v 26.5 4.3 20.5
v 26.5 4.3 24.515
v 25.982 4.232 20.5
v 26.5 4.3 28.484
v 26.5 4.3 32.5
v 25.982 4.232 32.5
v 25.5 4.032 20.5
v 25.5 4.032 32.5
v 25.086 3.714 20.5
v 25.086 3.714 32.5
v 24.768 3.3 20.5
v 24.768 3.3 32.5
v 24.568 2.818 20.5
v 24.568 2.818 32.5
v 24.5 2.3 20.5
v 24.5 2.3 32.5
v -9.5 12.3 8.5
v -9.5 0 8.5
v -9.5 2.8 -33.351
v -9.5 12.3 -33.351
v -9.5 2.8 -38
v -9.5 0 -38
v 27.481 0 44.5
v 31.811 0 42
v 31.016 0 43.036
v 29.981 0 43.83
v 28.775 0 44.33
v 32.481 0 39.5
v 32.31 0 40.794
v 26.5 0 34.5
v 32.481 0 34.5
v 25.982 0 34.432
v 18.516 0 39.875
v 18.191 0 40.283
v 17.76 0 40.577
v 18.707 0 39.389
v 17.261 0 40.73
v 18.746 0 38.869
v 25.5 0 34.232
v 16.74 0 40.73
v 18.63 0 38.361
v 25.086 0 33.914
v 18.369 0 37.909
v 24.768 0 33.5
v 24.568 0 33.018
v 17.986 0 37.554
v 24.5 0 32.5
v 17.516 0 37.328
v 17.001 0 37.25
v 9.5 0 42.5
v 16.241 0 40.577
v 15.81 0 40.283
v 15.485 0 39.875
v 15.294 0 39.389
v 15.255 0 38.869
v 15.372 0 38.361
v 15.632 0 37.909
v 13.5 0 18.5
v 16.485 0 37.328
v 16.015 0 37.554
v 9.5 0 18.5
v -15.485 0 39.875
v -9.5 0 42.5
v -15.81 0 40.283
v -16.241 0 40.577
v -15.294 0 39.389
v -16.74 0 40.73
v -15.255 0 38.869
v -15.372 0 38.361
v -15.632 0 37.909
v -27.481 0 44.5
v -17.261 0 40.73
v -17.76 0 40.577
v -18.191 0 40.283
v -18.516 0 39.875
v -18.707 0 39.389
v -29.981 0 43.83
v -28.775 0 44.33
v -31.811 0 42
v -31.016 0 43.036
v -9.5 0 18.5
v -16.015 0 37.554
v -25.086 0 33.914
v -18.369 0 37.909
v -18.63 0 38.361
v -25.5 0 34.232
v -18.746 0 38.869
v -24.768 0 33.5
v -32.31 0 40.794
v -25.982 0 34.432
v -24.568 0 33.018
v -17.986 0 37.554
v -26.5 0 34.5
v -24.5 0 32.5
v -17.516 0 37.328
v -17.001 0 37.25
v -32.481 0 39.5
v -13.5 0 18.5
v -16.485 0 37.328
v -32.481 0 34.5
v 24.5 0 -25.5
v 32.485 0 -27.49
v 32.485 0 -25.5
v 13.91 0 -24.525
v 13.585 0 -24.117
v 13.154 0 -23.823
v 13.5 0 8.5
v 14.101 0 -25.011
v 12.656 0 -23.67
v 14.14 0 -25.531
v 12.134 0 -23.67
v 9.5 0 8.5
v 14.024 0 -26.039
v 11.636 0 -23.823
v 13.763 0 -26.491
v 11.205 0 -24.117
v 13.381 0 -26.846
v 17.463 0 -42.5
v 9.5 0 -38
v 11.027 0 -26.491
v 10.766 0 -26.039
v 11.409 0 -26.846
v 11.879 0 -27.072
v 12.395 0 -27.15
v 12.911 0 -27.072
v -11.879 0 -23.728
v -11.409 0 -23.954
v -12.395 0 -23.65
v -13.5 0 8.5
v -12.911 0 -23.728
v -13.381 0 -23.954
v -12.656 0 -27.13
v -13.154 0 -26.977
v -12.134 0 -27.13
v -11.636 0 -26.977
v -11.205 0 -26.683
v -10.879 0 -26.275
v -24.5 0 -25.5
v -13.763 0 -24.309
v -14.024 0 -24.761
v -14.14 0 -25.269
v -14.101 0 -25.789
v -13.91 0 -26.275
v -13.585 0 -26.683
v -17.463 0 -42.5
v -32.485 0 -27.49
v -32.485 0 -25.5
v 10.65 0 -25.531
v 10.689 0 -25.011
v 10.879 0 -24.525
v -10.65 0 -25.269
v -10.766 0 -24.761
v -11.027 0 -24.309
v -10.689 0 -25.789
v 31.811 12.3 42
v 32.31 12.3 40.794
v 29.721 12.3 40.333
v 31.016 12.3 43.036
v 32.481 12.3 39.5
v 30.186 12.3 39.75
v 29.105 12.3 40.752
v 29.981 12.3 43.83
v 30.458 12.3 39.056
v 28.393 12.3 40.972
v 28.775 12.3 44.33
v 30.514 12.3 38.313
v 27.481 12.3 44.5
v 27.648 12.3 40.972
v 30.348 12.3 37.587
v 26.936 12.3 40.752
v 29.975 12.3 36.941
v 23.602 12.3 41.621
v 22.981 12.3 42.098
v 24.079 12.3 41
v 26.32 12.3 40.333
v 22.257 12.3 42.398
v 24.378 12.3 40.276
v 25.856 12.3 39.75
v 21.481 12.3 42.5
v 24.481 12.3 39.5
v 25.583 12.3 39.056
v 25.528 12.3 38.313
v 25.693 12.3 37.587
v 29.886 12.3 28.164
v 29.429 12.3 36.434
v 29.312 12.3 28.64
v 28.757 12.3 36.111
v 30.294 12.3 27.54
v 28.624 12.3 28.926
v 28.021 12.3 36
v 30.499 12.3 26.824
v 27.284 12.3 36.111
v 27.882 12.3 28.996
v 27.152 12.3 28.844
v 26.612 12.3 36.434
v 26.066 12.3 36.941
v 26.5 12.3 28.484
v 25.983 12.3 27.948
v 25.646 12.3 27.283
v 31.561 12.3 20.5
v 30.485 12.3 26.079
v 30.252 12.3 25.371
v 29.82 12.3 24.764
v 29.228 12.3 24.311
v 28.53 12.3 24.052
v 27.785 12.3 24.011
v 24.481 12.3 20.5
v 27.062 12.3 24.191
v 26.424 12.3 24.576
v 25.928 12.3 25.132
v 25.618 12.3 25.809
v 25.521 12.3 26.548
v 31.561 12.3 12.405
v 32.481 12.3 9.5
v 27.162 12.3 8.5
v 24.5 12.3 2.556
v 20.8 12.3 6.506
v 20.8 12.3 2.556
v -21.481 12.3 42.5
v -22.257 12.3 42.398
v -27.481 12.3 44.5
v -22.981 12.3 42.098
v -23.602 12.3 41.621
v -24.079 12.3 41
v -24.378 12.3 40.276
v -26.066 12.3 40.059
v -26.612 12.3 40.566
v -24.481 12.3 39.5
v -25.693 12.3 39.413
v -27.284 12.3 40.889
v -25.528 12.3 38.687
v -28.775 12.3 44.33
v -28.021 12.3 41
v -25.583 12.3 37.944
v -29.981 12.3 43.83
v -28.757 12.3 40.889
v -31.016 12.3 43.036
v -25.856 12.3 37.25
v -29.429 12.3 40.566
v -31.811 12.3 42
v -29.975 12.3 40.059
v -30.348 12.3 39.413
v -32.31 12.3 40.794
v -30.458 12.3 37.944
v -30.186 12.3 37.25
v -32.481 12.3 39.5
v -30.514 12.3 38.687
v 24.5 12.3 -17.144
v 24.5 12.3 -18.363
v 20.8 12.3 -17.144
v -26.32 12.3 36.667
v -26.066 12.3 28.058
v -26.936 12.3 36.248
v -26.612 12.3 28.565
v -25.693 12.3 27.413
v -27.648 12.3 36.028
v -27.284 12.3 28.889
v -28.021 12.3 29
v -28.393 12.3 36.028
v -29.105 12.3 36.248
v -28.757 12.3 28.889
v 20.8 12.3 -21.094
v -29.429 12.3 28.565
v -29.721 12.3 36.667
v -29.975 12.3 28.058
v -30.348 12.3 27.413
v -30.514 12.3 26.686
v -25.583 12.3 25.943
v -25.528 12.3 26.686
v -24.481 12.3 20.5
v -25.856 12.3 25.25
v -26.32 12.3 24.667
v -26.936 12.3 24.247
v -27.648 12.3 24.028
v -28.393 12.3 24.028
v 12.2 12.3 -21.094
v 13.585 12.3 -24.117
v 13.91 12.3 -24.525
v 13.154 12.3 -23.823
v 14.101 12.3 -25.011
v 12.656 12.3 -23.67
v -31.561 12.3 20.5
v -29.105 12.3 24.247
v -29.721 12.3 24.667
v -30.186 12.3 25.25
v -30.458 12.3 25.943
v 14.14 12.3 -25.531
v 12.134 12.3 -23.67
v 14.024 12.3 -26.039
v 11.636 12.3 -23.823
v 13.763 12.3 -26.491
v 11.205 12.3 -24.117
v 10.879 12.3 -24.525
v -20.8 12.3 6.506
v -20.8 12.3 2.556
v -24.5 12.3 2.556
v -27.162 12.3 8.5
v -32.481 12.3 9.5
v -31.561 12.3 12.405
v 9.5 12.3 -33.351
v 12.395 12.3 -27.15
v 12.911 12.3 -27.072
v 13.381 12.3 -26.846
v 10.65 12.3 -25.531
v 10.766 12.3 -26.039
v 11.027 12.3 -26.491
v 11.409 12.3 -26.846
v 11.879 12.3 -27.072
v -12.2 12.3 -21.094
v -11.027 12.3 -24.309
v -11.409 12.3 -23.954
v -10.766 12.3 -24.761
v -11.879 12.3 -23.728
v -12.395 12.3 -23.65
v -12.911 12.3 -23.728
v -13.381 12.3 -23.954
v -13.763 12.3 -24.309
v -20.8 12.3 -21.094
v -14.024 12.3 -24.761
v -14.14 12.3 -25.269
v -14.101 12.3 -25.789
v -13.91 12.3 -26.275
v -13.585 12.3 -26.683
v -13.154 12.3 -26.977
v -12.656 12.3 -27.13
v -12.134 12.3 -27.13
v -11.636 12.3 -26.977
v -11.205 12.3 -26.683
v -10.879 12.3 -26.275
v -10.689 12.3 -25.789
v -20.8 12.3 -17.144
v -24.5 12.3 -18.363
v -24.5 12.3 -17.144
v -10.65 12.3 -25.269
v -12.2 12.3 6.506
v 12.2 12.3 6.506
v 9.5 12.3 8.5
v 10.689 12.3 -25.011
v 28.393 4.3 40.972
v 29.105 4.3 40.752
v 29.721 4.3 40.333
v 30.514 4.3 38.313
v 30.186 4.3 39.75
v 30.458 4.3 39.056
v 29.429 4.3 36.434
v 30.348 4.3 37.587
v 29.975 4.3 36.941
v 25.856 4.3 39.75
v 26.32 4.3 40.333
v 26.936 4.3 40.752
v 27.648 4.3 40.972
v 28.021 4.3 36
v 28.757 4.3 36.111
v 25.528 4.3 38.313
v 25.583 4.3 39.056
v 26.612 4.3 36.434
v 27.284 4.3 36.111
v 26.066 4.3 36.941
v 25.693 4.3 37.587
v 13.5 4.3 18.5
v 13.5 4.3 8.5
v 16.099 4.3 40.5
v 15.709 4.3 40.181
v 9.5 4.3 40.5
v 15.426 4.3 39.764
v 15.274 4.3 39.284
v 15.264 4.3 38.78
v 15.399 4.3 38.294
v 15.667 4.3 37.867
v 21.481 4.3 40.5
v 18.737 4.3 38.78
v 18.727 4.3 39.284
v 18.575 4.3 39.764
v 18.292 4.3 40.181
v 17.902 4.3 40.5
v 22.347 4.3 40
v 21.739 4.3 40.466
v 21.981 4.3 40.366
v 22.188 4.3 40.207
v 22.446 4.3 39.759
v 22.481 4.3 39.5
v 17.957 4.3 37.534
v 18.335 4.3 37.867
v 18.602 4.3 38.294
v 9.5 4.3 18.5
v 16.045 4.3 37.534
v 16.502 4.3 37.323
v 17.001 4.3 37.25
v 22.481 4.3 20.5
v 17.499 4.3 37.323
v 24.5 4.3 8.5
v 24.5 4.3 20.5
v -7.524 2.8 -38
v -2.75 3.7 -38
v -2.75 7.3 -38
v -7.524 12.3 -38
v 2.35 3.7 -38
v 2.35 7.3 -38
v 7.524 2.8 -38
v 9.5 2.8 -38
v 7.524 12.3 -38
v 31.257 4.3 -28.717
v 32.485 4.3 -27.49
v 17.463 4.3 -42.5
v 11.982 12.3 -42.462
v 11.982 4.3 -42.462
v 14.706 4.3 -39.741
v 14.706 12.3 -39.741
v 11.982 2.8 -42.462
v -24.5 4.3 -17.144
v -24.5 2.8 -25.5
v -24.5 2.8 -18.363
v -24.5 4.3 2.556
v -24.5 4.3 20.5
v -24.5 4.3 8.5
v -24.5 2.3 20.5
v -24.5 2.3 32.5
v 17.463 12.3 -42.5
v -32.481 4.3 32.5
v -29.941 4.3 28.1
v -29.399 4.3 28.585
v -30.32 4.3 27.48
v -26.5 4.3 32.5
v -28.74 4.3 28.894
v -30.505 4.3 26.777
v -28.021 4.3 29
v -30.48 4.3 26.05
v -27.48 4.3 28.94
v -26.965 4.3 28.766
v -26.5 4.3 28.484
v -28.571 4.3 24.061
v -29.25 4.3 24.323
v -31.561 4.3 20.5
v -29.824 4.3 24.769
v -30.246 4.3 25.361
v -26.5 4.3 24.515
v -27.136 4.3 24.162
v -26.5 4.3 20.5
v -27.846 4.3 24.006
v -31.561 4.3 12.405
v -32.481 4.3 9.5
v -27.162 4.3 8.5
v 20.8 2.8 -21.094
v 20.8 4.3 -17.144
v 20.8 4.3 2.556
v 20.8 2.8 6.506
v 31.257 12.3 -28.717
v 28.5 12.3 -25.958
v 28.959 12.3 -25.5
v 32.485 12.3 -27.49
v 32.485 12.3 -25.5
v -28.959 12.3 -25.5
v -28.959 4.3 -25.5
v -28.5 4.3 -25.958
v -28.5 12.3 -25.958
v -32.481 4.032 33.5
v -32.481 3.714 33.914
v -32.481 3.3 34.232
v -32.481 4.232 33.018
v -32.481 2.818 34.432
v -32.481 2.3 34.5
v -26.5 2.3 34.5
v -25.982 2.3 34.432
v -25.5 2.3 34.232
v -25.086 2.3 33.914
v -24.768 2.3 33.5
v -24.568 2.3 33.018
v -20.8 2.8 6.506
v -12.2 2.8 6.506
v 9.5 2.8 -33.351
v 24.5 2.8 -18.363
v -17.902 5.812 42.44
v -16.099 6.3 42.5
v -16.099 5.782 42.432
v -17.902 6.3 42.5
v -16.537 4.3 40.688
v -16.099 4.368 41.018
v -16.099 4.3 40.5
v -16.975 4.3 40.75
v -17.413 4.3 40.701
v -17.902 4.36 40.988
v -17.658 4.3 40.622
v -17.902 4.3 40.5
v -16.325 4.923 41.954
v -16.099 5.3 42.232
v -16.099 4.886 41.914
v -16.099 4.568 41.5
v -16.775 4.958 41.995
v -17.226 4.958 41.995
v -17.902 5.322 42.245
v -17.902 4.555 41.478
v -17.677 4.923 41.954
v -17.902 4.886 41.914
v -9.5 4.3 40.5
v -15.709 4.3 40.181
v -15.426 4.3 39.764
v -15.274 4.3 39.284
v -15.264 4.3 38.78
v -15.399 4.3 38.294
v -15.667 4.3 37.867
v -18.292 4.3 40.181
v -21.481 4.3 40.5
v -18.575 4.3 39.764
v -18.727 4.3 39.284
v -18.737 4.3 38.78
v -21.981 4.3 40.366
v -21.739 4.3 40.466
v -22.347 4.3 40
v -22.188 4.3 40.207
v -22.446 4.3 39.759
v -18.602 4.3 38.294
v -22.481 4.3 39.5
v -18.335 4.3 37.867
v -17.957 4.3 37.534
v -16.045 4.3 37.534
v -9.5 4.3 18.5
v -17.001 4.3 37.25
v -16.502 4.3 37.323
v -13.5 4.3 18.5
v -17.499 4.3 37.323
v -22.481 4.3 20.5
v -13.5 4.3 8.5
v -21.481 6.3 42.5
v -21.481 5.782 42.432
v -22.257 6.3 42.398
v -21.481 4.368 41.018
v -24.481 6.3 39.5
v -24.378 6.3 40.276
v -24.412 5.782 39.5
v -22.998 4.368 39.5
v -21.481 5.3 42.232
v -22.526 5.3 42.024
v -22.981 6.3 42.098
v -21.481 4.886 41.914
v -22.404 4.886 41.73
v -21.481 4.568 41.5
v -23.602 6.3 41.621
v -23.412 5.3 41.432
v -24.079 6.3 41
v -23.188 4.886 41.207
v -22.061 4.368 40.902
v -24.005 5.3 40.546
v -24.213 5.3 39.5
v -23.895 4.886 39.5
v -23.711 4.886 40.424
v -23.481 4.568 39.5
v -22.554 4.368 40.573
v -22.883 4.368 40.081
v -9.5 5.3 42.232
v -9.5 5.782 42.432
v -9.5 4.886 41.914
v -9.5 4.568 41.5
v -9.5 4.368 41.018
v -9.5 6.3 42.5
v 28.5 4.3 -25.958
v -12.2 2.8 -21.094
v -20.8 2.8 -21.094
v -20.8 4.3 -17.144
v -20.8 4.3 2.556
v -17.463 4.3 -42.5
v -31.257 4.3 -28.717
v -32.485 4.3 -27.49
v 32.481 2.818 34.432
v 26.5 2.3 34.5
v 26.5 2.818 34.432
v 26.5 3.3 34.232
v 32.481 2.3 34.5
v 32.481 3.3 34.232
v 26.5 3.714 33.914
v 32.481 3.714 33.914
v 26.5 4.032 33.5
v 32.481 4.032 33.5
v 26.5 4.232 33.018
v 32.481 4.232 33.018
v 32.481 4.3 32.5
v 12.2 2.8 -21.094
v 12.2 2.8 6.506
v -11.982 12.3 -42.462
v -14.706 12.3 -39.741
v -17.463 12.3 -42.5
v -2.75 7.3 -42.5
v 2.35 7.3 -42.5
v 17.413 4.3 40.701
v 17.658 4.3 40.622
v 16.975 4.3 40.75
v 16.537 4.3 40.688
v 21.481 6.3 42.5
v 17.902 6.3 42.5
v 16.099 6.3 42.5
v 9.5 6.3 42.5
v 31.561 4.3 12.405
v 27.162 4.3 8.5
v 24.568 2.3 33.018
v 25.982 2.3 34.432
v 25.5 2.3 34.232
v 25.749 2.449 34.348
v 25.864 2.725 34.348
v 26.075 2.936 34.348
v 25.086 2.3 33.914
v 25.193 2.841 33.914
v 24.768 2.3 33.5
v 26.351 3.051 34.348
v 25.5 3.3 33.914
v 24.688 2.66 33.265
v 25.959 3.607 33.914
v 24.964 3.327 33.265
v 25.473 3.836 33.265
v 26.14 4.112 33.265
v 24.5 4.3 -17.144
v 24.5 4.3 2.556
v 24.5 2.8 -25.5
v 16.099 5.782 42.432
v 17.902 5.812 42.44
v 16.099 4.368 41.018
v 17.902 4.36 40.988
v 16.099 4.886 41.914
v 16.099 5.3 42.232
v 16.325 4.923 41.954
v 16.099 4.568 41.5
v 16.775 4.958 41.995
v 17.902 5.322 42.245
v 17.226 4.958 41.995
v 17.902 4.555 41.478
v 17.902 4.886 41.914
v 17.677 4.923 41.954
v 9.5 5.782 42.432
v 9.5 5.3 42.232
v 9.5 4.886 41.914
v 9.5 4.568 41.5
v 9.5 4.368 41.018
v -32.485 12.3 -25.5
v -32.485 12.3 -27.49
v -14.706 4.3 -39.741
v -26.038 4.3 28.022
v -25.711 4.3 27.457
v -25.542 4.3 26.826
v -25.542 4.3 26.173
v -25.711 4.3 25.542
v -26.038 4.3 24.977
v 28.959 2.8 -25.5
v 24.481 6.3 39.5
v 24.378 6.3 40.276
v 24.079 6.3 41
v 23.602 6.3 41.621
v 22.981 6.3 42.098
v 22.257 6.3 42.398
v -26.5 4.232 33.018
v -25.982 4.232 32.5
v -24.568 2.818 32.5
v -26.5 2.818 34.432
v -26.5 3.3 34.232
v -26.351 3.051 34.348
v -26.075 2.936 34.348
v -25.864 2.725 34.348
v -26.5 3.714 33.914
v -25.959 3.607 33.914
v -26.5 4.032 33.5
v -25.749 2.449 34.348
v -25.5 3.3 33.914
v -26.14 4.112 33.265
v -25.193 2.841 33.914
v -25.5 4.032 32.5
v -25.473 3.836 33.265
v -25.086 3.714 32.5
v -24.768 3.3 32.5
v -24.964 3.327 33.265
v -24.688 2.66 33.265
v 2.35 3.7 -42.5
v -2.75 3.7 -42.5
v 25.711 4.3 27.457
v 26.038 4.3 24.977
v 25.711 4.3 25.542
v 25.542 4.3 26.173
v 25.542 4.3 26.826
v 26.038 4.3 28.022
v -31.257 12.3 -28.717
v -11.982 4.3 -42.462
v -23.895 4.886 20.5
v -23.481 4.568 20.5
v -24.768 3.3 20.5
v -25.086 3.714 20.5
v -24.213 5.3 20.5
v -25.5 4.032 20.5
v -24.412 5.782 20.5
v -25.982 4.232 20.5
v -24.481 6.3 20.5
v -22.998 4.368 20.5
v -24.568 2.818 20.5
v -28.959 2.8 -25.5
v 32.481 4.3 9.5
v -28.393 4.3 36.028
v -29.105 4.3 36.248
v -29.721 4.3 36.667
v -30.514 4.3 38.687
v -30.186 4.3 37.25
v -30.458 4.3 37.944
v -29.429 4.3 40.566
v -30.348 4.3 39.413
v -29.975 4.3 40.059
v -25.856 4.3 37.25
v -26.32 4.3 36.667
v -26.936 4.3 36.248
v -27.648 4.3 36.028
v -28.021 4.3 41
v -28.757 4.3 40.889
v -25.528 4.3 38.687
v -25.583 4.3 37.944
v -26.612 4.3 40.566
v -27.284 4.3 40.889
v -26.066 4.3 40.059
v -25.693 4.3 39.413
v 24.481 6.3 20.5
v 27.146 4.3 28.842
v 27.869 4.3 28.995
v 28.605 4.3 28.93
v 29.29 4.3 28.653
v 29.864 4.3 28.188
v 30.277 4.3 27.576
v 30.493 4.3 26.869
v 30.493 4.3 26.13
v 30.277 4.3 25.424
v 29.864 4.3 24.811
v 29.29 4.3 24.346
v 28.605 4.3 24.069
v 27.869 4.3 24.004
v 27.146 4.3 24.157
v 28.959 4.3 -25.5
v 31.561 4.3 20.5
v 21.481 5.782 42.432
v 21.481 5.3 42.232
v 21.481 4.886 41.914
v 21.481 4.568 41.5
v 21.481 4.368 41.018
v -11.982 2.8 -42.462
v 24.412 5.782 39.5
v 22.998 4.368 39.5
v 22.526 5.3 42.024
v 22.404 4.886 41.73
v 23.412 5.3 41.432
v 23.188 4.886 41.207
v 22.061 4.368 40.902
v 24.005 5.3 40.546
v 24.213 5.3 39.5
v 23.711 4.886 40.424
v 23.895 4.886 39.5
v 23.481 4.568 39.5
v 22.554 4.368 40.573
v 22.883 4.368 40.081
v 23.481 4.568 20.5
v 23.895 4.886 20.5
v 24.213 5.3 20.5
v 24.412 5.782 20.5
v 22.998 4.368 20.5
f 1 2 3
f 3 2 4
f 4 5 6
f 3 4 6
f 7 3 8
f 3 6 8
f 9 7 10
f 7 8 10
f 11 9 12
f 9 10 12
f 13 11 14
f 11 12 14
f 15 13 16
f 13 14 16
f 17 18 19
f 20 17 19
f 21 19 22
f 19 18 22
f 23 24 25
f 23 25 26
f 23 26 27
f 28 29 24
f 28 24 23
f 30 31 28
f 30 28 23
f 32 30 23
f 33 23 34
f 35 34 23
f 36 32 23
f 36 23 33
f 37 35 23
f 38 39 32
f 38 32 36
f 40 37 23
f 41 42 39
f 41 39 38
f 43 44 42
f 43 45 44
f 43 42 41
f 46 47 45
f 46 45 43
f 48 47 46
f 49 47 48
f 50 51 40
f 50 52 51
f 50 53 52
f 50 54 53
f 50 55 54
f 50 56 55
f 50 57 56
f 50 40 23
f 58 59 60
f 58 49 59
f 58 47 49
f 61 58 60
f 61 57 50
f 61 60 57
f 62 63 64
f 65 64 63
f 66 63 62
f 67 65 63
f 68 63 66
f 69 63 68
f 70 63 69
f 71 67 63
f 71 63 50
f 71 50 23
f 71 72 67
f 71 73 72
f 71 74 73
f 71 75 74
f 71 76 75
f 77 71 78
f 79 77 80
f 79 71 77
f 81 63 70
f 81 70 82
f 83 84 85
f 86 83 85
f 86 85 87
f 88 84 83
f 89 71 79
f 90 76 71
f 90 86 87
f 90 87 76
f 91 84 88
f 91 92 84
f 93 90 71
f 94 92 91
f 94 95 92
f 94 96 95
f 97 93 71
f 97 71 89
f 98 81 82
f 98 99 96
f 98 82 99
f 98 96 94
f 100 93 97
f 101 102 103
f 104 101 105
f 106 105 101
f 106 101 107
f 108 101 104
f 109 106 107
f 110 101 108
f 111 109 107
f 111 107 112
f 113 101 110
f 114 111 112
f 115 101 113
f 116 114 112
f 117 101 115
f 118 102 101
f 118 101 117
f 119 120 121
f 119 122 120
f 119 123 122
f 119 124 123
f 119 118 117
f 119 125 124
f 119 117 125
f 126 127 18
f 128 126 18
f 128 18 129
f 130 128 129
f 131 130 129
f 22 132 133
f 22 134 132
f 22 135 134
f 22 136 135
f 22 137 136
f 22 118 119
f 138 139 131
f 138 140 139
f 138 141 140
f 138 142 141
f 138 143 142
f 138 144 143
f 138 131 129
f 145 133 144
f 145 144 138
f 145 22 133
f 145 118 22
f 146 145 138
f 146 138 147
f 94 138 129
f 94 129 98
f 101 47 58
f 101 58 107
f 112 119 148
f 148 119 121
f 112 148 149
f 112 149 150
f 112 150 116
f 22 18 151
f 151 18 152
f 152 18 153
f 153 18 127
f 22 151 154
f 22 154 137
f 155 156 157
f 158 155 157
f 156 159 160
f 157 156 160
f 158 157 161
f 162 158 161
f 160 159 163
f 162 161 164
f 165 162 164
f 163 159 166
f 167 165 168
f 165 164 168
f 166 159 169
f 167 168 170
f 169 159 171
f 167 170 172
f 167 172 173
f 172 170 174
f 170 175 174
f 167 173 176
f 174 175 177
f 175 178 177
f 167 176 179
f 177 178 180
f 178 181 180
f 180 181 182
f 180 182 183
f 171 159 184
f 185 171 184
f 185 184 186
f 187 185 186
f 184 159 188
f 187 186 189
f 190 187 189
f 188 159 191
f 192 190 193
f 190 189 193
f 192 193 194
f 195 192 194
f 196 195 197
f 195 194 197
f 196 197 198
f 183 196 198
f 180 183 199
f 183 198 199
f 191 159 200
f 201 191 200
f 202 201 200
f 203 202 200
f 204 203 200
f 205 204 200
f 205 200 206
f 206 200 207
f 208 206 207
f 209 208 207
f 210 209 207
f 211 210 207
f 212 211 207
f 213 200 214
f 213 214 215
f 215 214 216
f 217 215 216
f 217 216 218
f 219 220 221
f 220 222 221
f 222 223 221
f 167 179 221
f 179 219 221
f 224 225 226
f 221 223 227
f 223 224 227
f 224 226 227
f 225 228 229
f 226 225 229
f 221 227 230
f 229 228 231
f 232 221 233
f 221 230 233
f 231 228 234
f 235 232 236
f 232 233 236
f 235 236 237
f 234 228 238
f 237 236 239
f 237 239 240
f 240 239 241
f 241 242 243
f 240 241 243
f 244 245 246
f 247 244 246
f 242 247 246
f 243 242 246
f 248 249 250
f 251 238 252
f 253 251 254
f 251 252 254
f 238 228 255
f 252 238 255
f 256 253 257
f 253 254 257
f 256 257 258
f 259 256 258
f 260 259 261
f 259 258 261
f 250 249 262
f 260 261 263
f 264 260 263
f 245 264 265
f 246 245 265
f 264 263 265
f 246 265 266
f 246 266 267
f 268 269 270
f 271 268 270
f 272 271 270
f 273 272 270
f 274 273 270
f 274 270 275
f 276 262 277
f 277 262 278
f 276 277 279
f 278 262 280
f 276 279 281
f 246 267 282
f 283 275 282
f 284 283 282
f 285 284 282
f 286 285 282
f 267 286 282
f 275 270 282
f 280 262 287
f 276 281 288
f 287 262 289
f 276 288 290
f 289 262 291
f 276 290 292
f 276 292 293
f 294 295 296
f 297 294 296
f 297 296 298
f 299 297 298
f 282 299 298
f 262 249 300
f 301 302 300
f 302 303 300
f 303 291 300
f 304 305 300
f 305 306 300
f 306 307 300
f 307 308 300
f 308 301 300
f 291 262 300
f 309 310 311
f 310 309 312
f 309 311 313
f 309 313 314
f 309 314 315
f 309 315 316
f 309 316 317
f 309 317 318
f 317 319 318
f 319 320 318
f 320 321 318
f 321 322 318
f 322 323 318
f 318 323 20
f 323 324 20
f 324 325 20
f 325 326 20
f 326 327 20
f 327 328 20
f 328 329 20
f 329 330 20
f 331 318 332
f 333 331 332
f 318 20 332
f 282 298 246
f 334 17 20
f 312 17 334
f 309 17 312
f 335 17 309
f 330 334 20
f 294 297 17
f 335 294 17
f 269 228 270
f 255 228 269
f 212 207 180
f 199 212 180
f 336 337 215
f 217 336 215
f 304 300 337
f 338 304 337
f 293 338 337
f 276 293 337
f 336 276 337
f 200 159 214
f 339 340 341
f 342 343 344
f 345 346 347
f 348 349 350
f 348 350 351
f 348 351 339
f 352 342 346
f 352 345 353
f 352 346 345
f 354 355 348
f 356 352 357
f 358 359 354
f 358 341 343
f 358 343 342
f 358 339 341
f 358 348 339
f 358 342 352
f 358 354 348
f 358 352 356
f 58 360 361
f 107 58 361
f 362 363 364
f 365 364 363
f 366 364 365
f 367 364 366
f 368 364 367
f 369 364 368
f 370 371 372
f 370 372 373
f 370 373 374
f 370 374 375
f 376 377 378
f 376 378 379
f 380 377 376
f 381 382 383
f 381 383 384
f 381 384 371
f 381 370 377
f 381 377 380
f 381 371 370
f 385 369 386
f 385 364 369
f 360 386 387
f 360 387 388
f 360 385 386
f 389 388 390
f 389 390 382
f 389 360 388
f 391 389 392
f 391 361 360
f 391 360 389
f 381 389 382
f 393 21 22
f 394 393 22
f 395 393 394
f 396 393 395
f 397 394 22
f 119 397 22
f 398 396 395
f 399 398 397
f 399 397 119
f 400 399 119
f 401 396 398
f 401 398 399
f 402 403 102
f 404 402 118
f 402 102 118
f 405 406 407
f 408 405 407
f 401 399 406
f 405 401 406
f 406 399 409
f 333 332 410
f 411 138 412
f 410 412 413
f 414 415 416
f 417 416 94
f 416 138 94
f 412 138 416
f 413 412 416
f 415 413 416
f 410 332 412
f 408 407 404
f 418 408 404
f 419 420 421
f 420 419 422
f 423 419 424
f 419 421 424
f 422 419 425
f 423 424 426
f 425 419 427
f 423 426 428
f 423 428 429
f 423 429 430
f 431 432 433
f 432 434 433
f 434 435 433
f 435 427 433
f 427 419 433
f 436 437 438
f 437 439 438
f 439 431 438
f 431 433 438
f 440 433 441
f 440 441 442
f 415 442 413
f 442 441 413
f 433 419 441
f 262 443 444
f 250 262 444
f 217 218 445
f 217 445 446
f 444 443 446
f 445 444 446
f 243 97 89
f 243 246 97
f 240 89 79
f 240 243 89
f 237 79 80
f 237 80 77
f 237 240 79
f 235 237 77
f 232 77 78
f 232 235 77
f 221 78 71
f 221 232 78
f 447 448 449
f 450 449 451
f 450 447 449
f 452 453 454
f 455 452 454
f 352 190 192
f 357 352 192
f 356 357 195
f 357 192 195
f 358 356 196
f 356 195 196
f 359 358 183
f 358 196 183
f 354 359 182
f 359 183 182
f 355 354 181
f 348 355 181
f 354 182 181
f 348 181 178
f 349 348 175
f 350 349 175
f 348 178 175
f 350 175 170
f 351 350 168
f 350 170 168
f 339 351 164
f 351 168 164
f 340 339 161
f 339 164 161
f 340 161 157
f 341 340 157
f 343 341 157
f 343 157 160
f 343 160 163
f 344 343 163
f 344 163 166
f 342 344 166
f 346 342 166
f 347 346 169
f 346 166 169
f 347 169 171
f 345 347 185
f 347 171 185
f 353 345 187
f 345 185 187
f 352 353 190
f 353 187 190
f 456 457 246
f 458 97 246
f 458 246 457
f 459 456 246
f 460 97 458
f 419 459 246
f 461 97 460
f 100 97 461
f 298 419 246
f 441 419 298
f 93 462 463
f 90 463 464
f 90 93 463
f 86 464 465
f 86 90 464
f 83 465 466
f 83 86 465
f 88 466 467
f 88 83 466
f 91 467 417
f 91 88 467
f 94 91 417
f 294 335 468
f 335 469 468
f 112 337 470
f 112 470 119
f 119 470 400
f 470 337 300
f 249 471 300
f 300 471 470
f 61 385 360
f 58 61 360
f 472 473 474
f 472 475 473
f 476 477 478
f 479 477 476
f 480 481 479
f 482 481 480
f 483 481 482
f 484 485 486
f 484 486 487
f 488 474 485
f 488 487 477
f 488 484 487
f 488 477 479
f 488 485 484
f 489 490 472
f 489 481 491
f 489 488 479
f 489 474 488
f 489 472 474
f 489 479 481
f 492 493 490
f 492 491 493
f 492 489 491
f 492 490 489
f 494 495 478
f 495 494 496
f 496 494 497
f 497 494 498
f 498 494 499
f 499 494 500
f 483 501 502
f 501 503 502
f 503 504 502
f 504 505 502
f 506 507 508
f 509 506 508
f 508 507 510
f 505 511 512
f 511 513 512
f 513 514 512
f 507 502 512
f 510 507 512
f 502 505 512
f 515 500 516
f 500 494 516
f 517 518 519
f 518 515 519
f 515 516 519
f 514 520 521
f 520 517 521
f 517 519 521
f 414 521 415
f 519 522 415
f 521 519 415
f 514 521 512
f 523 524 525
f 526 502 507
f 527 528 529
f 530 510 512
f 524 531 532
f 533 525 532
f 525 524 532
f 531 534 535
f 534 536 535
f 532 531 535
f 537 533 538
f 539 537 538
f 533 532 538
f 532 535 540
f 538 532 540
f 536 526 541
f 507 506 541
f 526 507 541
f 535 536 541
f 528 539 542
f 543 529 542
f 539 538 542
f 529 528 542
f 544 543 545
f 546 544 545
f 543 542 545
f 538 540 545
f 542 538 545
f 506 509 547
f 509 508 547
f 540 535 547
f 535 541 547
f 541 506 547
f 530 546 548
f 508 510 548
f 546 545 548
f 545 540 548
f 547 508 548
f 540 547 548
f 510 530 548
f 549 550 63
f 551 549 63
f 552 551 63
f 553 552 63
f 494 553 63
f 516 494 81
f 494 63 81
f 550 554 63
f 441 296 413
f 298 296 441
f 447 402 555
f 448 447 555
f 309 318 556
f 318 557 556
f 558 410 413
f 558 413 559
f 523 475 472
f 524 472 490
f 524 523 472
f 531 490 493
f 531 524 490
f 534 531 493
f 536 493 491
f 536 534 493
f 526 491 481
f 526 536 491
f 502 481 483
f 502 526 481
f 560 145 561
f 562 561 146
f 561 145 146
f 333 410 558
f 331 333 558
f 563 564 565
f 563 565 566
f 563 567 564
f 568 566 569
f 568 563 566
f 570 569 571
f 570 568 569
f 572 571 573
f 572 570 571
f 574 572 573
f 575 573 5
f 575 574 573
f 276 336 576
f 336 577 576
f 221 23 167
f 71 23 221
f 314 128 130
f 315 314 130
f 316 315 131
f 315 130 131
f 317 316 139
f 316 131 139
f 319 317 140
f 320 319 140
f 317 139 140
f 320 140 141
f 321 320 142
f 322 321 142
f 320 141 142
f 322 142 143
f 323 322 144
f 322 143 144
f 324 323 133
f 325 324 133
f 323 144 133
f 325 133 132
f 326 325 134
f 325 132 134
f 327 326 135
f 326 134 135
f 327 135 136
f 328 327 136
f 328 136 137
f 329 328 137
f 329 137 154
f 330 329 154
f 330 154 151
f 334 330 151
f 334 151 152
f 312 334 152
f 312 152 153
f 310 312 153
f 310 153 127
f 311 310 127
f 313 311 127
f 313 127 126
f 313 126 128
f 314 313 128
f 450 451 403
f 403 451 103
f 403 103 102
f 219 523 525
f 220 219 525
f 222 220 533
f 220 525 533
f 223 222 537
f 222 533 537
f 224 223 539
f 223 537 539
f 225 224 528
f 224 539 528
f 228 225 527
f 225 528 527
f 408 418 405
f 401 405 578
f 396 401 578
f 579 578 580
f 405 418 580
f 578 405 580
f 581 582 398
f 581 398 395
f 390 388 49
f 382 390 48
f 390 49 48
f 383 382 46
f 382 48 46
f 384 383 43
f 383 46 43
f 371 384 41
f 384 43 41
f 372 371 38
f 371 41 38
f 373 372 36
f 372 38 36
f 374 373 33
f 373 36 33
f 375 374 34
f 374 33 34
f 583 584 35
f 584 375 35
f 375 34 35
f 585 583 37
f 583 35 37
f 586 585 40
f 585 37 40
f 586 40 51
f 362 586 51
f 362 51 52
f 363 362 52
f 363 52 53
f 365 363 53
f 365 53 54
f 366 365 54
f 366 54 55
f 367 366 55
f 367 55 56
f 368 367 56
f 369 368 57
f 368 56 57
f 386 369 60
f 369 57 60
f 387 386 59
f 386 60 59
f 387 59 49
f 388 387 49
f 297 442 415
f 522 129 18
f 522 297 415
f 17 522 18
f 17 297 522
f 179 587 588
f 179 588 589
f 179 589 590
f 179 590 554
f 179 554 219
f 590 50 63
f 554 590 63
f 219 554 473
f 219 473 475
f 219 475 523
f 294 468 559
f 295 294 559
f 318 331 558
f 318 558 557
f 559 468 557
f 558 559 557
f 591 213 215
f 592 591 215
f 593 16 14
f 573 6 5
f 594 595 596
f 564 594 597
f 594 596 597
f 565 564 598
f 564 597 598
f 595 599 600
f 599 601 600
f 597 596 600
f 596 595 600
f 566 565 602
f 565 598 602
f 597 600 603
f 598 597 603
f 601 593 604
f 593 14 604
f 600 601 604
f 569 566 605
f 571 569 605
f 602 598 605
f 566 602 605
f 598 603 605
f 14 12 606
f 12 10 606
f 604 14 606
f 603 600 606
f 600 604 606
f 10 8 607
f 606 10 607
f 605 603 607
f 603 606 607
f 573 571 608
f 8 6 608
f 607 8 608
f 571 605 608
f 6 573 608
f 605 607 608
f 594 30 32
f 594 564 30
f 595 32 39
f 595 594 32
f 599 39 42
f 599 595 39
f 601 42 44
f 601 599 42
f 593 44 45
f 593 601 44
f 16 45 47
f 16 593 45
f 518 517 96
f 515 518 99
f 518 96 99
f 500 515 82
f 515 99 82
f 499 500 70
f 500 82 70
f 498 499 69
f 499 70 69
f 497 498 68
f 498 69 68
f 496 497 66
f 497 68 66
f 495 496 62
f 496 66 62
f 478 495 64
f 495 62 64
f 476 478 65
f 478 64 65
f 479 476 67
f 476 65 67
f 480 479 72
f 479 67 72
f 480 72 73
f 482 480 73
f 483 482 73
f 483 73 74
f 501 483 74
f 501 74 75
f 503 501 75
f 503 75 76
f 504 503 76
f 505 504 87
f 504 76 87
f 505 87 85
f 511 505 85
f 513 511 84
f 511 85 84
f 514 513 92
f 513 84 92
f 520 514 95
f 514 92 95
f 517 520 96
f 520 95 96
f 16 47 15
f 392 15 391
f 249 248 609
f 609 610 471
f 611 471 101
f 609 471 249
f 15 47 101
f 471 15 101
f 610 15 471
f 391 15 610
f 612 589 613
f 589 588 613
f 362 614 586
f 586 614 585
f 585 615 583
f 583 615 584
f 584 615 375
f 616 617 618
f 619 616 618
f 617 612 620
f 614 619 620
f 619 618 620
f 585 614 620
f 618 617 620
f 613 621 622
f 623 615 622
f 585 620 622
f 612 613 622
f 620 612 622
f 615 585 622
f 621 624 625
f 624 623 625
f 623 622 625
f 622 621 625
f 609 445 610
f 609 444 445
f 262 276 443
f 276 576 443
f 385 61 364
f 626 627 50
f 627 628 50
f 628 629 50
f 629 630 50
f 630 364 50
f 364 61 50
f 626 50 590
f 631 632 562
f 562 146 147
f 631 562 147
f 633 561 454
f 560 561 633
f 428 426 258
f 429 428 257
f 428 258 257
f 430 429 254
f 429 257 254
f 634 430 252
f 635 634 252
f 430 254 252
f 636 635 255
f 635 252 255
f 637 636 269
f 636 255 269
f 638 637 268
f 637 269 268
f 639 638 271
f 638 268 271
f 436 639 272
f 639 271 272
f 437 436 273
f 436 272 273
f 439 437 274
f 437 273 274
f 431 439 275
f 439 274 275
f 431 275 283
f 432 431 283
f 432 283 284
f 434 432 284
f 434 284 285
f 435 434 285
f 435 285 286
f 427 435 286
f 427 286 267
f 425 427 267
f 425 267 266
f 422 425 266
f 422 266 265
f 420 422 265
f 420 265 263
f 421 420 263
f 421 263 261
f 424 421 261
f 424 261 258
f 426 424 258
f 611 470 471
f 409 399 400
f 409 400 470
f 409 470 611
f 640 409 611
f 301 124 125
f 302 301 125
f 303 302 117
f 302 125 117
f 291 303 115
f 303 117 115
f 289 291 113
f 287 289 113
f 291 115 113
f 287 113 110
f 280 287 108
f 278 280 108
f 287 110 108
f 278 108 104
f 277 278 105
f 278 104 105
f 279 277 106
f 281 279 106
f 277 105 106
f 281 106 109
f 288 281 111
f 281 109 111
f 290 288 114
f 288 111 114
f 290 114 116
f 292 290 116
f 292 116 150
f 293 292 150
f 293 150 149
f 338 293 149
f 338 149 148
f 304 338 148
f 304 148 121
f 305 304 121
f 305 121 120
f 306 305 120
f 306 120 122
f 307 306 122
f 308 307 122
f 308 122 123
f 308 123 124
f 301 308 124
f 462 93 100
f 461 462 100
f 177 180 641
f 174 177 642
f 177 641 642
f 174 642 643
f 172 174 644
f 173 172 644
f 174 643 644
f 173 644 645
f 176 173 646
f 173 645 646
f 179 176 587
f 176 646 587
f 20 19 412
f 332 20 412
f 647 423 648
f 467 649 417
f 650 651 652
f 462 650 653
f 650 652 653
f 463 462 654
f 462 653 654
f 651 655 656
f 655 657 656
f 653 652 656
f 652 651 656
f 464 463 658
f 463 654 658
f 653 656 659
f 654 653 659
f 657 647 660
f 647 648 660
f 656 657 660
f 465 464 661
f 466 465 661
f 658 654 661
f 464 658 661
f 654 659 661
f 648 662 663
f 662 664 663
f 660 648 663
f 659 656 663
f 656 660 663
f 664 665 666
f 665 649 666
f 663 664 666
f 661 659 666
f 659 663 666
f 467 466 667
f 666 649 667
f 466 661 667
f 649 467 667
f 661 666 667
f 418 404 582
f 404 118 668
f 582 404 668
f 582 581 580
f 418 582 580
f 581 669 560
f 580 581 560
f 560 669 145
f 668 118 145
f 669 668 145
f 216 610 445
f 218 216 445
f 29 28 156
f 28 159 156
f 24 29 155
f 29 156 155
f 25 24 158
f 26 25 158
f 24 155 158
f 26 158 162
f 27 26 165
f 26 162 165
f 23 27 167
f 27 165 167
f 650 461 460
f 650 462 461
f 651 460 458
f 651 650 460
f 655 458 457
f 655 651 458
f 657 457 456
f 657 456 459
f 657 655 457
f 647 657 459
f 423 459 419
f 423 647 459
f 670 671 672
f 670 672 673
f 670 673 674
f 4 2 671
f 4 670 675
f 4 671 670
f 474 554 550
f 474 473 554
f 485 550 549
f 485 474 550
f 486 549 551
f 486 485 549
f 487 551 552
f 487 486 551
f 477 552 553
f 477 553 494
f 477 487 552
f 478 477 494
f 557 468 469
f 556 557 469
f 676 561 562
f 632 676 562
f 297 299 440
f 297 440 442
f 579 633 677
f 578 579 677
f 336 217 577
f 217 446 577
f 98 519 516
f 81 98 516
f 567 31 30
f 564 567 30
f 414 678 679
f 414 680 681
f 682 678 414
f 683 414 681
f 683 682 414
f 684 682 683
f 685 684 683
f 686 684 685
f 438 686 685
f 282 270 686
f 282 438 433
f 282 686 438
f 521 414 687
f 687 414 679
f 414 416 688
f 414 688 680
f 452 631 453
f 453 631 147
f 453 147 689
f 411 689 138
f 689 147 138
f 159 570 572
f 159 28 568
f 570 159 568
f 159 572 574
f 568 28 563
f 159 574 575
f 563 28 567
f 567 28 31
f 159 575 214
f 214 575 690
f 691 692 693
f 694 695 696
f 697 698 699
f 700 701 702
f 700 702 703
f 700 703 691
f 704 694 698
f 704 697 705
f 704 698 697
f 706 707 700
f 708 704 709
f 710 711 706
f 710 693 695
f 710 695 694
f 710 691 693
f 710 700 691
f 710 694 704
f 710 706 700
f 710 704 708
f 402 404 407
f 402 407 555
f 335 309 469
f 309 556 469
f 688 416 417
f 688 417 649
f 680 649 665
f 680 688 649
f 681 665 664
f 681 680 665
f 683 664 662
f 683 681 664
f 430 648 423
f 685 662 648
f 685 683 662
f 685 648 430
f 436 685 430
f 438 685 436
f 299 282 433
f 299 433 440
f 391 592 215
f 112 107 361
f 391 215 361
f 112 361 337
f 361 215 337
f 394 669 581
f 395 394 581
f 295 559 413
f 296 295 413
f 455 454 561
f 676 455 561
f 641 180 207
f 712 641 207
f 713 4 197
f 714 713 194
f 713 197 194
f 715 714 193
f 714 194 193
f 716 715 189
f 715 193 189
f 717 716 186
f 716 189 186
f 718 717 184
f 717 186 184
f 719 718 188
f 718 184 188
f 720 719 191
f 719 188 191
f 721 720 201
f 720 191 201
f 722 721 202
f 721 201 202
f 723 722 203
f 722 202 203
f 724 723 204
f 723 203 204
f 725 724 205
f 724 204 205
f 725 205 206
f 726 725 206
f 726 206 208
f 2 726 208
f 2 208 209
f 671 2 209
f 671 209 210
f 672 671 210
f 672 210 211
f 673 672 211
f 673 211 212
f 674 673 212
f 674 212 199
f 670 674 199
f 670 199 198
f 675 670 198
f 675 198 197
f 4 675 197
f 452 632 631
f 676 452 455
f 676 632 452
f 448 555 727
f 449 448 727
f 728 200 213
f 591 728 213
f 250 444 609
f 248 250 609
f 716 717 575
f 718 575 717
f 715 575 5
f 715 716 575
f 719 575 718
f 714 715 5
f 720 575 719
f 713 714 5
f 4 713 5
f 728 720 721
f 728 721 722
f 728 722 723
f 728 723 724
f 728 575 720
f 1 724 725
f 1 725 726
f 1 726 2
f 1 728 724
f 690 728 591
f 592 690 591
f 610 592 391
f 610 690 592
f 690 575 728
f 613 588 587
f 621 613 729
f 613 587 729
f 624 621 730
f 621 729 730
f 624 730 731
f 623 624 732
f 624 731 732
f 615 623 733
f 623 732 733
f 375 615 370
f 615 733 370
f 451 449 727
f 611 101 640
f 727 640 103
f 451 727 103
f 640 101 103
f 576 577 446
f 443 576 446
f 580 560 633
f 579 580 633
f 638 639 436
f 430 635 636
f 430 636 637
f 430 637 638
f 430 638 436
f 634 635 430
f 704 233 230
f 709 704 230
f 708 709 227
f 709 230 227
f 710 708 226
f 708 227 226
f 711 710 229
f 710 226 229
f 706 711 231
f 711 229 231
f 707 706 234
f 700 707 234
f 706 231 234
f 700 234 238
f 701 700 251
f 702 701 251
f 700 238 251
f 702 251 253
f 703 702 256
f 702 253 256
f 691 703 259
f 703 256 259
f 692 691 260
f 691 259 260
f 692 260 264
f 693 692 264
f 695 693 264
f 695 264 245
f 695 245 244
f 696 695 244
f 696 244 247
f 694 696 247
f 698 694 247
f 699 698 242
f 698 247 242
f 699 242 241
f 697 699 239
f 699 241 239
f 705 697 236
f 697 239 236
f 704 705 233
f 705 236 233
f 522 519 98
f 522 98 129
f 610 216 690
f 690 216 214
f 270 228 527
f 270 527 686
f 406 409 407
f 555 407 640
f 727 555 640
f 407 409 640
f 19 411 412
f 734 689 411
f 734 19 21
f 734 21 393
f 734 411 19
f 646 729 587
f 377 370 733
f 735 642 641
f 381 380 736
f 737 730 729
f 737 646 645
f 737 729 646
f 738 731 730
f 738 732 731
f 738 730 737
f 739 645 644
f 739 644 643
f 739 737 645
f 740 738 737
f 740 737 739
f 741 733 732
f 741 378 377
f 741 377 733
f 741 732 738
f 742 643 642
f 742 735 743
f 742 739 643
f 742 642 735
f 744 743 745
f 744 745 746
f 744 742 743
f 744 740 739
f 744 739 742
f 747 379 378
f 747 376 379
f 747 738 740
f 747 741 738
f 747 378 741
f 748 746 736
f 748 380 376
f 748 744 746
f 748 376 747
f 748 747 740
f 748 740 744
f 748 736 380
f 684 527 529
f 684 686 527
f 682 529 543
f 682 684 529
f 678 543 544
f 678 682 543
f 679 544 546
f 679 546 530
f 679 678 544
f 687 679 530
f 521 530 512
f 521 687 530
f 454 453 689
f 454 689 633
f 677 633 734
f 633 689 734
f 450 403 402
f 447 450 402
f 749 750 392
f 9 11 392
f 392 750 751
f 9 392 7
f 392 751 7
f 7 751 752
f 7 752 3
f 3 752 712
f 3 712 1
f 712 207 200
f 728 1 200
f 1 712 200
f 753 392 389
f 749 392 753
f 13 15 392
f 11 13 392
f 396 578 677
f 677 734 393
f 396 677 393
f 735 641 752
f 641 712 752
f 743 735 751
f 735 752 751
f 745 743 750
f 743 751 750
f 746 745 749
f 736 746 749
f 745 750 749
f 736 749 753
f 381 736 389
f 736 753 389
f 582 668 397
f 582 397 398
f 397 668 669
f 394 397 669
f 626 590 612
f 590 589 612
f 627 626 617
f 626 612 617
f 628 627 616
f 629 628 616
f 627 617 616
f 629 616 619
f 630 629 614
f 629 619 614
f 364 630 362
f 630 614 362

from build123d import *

# Parameters (mm, degrees)
SKETCH1_W               = 70
SKETCH1_H               = 85
BOSS_EXTRUDE1_DEPTH     = 2.8
SKETCH2_W               = 10.5
SKETCH2_H               = 60
CUT_EXTRUDE1_DEPTH      = 10
SKETCH3_W               = 2.519429159
SKETCH3_H               = 8
CUT_EXTRUDE2_DEPTH      = 10
CUT_EXTRUDE3_DEPTH      = 10
BOSS_EXTRUDE2_OUTLINE_W = 8.6
BOSS_EXTRUDE2_OUTLINE_H = 27.6
BOSS_EXTRUDE2_DEPTH     = 1.5
BOSS_EXTRUDE3_DEPTH     = 8
BOSS_EXTRUDE4_DEPTH     = 8
CUT_EXTRUDE5_DEPTH      = 8
SKETCH14_W              = 64.961141682
SKETCH14_H              = 2
BOSS_EXTRUDE5_DEPTH     = 12.3
FILLET1_R               = 5
SKETCH15_W              = 4
SKETCH15_H              = 10
CUT_EXTRUDE8_DEPTH      = 12.7
SKETCH16_R              = 1.75
CUT_EXTRUDE9_DEPTH      = 12.7
FILLET3_R               = 2
FILLET4_R               = 2
FILLET5_R               = 3
FILLET6_R               = 2
SKETCH17_R              = 2.5
CUT_EXTRUDE10_DEPTH     = 8
SKETCH18_W              = 19
SKETCH18_H              = 7
CUT_EXTRUDE11_DEPTH     = 57.451881976
SKETCH19_W              = 5.1
SKETCH19_H              = 3.6
CUT_EXTRUDE12_DEPTH     = 10


# Read off the part's stored shape, not the designer's step: Boss-Extrude2
with BuildPart() as part:
    # Sketch1 → Boss-Extrude1 (new body)
    with BuildSketch(Plane(origin=(0, 0, 0), x_dir=(1, 0, 0), z_dir=(0, 1, 0))):
        Rectangle(SKETCH1_W, SKETCH1_H)
    extrude(amount=BOSS_EXTRUDE1_DEPTH)

    # Sketch2 → Cut-Extrude1 (cut)
    with BuildSketch(Plane(origin=(0, 0, 0), x_dir=(-1, 0, 0), z_dir=(0, -1, 0))):
        with Locations((-29.75, -4.5)):
            Rectangle(SKETCH2_W, SKETCH2_H)
        with Locations((29.75, -4.5)):
            Rectangle(SKETCH2_W, SKETCH2_H)
    extrude(amount=-CUT_EXTRUDE1_DEPTH, mode=Mode.SUBTRACT)

    # Sketch3 → Cut-Extrude2 (cut)
    with BuildSketch(Plane(origin=(0, 2.8, 0), x_dir=(1, 0, 0), z_dir=(0, 1, 0))):
        Polygon((17.462549034, 42.5), (35, 42.5), (35, 25.5), (32.484854108, 25.5), (32.484996169, 27.489999862), align=None)
        with Locations((33.740285421, -38.5)):
            Rectangle(SKETCH3_W, SKETCH3_H)
        with Locations((-33.740285421, -38.5)):
            Rectangle(SKETCH3_W, SKETCH3_H)
        Polygon((-32.484996169, 27.489999862), (-17.462549034, 42.5), (-35, 42.5), (-35, 25.5), (-32.484854108, 25.5), align=None)
    extrude(amount=-CUT_EXTRUDE2_DEPTH, mode=Mode.SUBTRACT)

    # Sketch5 → Cut-Extrude3 (cut)
    with BuildSketch(Plane(origin=(0, 2.8, 0), x_dir=(1, 0, 0), z_dir=(0, 1, 0))):
        Polygon((-9.5, -42.5), (9.5, -42.5), (9.5, 31), (5.25, 31), (5.25, 38), (-5.25, 38), (-5.25, 31), (-9.5, 31), align=None)
    extrude(amount=-CUT_EXTRUDE3_DEPTH, mode=Mode.SUBTRACT)

    # Boss-Extrude2 outline → Boss-Extrude2 (add)
    with BuildSketch(Plane(origin=(0, 2.8, 0), x_dir=(1, 0, 0), z_dir=(0, 1, 0))):
        Polygon((-32.480570841, -42.5), (-9.5, -42.5), (-9.5, 31), (-5.25, 31), (-5.25, 38), (5.25, 38), (5.25, 31), (9.5, 31), (9.5, -42.5), (32.480570841, -42.5), (32.480570841, -34.5), (24.5, -34.5), (24.5, 18.363483562), (6.1866146, 36.661695224), (11.982486603, 42.462373437), (28.958926038, 25.5), (32.484854108, 25.5), (32.484996169, 27.489999862), (17.462549034, 42.5), (-17.462549034, 42.5), (-32.484996169, 27.489999862), (-32.484854108, 25.5), (-28.958926038, 25.5), (-11.982486603, 42.462373437), (-6.1866146, 36.661695224), (-24.5, 18.363483562), (-24.5, -34.5), (-32.480570841, -34.5), align=None)
        with Locations((-16.5, 7.293849796)):
            Rectangle(BOSS_EXTRUDE2_OUTLINE_W, BOSS_EXTRUDE2_OUTLINE_H, mode=Mode.SUBTRACT)
        with Locations((16.5, 7.293849796)):
            Rectangle(BOSS_EXTRUDE2_OUTLINE_W, BOSS_EXTRUDE2_OUTLINE_H, mode=Mode.SUBTRACT)
    extrude(amount=BOSS_EXTRUDE2_DEPTH)

    # Sketch9 → Boss-Extrude3 (add)
    with BuildSketch(Plane(origin=(0, 4.3, 0), x_dir=(1, 0, 0), z_dir=(0, 1, 0))):
        Polygon((-24.5, -34.5), (-32.480570841, -34.5), (-32.480570841, -42.5), (-9.5, -42.5), (-9.5, 31), (-5.25, 31), (-5.25, 38), (0, 38), (5.25, 38), (5.25, 31), (9.5, 31), (9.5, -42.5), (32.480570841, -42.5), (32.480570841, -34.5), (24.5, -34.5), (24.5, -2.556150204), (20.8, -2.556150204), (20.8, -6.506150204), (12.2, -6.506150204), (12.2, 21.093849796), (20.8, 21.093849796), (20.8, 17.143849796), (24.5, 17.143849796), (24.5, 18.363483562), (6.1866146, 36.661695224), (11.982486603, 42.462373437), (14.705975764, 39.74114085), (17.462549034, 42.5), (-17.462549034, 42.5), (-14.705975764, 39.74114085), (-11.982486603, 42.462373437), (-6.1866146, 36.661695224), (-24.5, 18.363483562), (-24.5, 17.143849796), (-20.8, 17.143849796), (-20.8, 21.093849796), (-12.2, 21.093849796), (-12.2, -6.506150204), (-20.8, -6.506150204), (-20.8, -2.556150204), (-24.5, -2.556150204), align=None)
        Polygon((-31.256844783, 28.717133652), (-32.484996169, 27.489999862), (-32.484854108, 25.5), (-28.958926038, 25.5), (-28.500271514, 25.958274502), align=None)
        Polygon((32.484996169, 27.489999862), (31.256844783, 28.717133652), (28.500271514, 25.958274502), (28.958926038, 25.5), (32.484854108, 25.5), align=None)
    extrude(amount=BOSS_EXTRUDE3_DEPTH)

    # Sketch10 → Boss-Extrude4 (add)
    with BuildSketch(Plane(origin=(0, 12.3, 0), x_dir=(1, 0, 0), z_dir=(0, 1, 0))):
        Polygon((-32.480570841, -34.5), (-24.5, -34.5), (-24.5, -2.556150204), (-32.480570841, -9.5), align=None)
        Polygon((32.480570841, -34.5), (24.5, -34.5), (24.5, -9.5), (24.5, -2.556150204), (32.480570841, -9.5), align=None)
    extrude(amount=-BOSS_EXTRUDE4_DEPTH)

    # Sketch11 → Cut-Extrude5 (cut)
    with BuildSketch(Plane(origin=(0, 12.3, 0), x_dir=(1, 0, 0), z_dir=(0, 1, 0))):
        Polygon((-24.480570841, -42.5), (-24.480570841, -20.499611406), (-31.560570841, -20.499611406), (-31.560570841, -12.405434935), (-27.162134436, -8.5), (-9.5, -8.5), (-9.5, -12.405776235), (-9.5, -42.5), align=None)
        Polygon((9.5, -42.5), (24.480570841, -42.5), (24.480570841, -20.499611406), (31.560570841, -20.499611406), (31.560570841, -12.405434935), (27.162134436, -8.5), (9.5, -8.5), (9.5, -12.405776235), align=None)
    extrude(amount=-CUT_EXTRUDE5_DEPTH, mode=Mode.SUBTRACT)

    # Sketch14 → Boss-Extrude5 (add)
    with BuildSketch(Plane(origin=(0, 0, 0), x_dir=(-1, 0, 0), z_dir=(0, -1, 0))):
        with Locations((0, -43.5)):
            Rectangle(SKETCH14_W, SKETCH14_H)
    extrude(amount=-BOSS_EXTRUDE5_DEPTH)

    # Fillet1
    fillet1_edges = [part.edges().sort_by_distance(p)[0] for p in [
        (32.480570841, 6.15, 44.5),
        (-32.480570841, 6.15, 44.5),
    ]]
    fillet(fillet1_edges, radius=FILLET1_R)

    # Sketch15 → Cut-Extrude8 (cut)
    with BuildSketch(Plane(origin=(0, 4.3, 0), x_dir=(1, 0, 0), z_dir=(0, 1, 0))):
        with Locations((-11.5, -13.5)):
            Rectangle(SKETCH15_W, SKETCH15_H)
        with Locations((11.5, -13.5)):
            Rectangle(SKETCH15_W, SKETCH15_H)
    extrude(amount=-CUT_EXTRUDE8_DEPTH, mode=Mode.SUBTRACT)

    # Sketch16 → Cut-Extrude9 (cut)
    with BuildSketch(Plane(origin=(0, 0, 0), x_dir=(-1, 0, 0), z_dir=(0, -1, 0))):
        with Locations(Location((-17.000570841, -39, 0), (0, 0, 90))):
            Circle(SKETCH16_R)
        with Locations(Location((-12.394846918, 25.4, 0), (0, 0, 90))):
            Circle(SKETCH16_R)
        with Locations(Location((12.394846918, 25.4, 0), (0, 0, 270))):
            Circle(SKETCH16_R)
        with Locations(Location((17.000570841, -39, 0), (0, 0, 90))):
            Circle(SKETCH16_R)
    extrude(amount=-CUT_EXTRUDE9_DEPTH, mode=Mode.SUBTRACT)

    # Fillet3
    fillet3_edges = [part.edges().sort_by_distance(p)[0] for p in [
        (-24.5, 4.3, 27.499805703),
        (24.5, 4.3, 27.499805703),
    ]]
    fillet(fillet3_edges, radius=FILLET3_R)

    # Fillet4
    fillet4_edges = [part.edges().sort_by_distance(p)[0] for p in [
        (-29.490285421, 4.3, 34.5),
        (24.5, 1.15, 34.5),
        (29.490285421, 4.3, 34.5),
        (25.085786438, 3.714213562, 34.5),
        (-24.5, 1.15, 34.5),
        (-25.085786438, 3.714213562, 34.5),
    ]]
    fillet(fillet4_edges, radius=FILLET4_R)

    # Fillet5
    fillet5_edges = [part.edges().sort_by_distance(p)[0] for p in [
        (-24.480570841, 8.3, 42.5),
        (24.480570841, 8.3, 42.5),
    ]]
    fillet(fillet5_edges, radius=FILLET5_R)

    # Fillet6
    fillet6_edges = [part.edges().sort_by_distance(p)[0] for p in [
        (-24.480570841, 4.3, 29.999805703),
        (15.490285421, 4.3, 42.5),
        (-15.490285421, 4.3, 42.5),
        (-23.601891185, 4.3, 41.621320344),
        (24.480570841, 4.3, 29.999805703),
        (23.601891185, 4.3, 41.621320344),
    ]]
    fillet(fillet6_edges, radius=FILLET6_R)

    # Sketch17 → Cut-Extrude10 (cut)
    with BuildSketch(Plane(origin=(0, 12.3, 0), x_dir=(1, 0, 0), z_dir=(0, 1, 0))):
        with Locations(Location((-28.020570841, -26.499611406, 0), (0, 0, 270))):
            Circle(SKETCH17_R)
        with Locations(Location((-28.020570841, -38.5, 0), (0, 0, 270))):
            Circle(SKETCH17_R)
        with Locations(Location((28.020570841, -38.5, 0), (0, 0, 90))):
            Circle(SKETCH17_R)
        with Locations(Location((28.020570841, -26.499611406, 0), (0, 0, 232.538489895))):
            Circle(SKETCH17_R)
    extrude(amount=-CUT_EXTRUDE10_DEPTH, mode=Mode.SUBTRACT)

    # Sketch18 → Cut-Extrude11 (cut, through all)
    with BuildSketch(Plane(origin=(0, 12.3, 0), x_dir=(1, 0, 0), z_dir=(0, 1, 0))):
        with Locations((0, 34.5)):
            Rectangle(SKETCH18_W, SKETCH18_H)
    extrude(amount=-CUT_EXTRUDE11_DEPTH, mode=Mode.SUBTRACT)

    # Sketch19 → Cut-Extrude12 (cut)
    with BuildSketch(Plane(origin=(0, 0, -42.5), x_dir=(-1, 0, 0), z_dir=(0, 0, -1))):
        with Locations((0.200058215, 5.5)):
            Rectangle(SKETCH19_W, SKETCH19_H)
    extrude(amount=-CUT_EXTRUDE12_DEPTH, mode=Mode.SUBTRACT)


solid = part.part
